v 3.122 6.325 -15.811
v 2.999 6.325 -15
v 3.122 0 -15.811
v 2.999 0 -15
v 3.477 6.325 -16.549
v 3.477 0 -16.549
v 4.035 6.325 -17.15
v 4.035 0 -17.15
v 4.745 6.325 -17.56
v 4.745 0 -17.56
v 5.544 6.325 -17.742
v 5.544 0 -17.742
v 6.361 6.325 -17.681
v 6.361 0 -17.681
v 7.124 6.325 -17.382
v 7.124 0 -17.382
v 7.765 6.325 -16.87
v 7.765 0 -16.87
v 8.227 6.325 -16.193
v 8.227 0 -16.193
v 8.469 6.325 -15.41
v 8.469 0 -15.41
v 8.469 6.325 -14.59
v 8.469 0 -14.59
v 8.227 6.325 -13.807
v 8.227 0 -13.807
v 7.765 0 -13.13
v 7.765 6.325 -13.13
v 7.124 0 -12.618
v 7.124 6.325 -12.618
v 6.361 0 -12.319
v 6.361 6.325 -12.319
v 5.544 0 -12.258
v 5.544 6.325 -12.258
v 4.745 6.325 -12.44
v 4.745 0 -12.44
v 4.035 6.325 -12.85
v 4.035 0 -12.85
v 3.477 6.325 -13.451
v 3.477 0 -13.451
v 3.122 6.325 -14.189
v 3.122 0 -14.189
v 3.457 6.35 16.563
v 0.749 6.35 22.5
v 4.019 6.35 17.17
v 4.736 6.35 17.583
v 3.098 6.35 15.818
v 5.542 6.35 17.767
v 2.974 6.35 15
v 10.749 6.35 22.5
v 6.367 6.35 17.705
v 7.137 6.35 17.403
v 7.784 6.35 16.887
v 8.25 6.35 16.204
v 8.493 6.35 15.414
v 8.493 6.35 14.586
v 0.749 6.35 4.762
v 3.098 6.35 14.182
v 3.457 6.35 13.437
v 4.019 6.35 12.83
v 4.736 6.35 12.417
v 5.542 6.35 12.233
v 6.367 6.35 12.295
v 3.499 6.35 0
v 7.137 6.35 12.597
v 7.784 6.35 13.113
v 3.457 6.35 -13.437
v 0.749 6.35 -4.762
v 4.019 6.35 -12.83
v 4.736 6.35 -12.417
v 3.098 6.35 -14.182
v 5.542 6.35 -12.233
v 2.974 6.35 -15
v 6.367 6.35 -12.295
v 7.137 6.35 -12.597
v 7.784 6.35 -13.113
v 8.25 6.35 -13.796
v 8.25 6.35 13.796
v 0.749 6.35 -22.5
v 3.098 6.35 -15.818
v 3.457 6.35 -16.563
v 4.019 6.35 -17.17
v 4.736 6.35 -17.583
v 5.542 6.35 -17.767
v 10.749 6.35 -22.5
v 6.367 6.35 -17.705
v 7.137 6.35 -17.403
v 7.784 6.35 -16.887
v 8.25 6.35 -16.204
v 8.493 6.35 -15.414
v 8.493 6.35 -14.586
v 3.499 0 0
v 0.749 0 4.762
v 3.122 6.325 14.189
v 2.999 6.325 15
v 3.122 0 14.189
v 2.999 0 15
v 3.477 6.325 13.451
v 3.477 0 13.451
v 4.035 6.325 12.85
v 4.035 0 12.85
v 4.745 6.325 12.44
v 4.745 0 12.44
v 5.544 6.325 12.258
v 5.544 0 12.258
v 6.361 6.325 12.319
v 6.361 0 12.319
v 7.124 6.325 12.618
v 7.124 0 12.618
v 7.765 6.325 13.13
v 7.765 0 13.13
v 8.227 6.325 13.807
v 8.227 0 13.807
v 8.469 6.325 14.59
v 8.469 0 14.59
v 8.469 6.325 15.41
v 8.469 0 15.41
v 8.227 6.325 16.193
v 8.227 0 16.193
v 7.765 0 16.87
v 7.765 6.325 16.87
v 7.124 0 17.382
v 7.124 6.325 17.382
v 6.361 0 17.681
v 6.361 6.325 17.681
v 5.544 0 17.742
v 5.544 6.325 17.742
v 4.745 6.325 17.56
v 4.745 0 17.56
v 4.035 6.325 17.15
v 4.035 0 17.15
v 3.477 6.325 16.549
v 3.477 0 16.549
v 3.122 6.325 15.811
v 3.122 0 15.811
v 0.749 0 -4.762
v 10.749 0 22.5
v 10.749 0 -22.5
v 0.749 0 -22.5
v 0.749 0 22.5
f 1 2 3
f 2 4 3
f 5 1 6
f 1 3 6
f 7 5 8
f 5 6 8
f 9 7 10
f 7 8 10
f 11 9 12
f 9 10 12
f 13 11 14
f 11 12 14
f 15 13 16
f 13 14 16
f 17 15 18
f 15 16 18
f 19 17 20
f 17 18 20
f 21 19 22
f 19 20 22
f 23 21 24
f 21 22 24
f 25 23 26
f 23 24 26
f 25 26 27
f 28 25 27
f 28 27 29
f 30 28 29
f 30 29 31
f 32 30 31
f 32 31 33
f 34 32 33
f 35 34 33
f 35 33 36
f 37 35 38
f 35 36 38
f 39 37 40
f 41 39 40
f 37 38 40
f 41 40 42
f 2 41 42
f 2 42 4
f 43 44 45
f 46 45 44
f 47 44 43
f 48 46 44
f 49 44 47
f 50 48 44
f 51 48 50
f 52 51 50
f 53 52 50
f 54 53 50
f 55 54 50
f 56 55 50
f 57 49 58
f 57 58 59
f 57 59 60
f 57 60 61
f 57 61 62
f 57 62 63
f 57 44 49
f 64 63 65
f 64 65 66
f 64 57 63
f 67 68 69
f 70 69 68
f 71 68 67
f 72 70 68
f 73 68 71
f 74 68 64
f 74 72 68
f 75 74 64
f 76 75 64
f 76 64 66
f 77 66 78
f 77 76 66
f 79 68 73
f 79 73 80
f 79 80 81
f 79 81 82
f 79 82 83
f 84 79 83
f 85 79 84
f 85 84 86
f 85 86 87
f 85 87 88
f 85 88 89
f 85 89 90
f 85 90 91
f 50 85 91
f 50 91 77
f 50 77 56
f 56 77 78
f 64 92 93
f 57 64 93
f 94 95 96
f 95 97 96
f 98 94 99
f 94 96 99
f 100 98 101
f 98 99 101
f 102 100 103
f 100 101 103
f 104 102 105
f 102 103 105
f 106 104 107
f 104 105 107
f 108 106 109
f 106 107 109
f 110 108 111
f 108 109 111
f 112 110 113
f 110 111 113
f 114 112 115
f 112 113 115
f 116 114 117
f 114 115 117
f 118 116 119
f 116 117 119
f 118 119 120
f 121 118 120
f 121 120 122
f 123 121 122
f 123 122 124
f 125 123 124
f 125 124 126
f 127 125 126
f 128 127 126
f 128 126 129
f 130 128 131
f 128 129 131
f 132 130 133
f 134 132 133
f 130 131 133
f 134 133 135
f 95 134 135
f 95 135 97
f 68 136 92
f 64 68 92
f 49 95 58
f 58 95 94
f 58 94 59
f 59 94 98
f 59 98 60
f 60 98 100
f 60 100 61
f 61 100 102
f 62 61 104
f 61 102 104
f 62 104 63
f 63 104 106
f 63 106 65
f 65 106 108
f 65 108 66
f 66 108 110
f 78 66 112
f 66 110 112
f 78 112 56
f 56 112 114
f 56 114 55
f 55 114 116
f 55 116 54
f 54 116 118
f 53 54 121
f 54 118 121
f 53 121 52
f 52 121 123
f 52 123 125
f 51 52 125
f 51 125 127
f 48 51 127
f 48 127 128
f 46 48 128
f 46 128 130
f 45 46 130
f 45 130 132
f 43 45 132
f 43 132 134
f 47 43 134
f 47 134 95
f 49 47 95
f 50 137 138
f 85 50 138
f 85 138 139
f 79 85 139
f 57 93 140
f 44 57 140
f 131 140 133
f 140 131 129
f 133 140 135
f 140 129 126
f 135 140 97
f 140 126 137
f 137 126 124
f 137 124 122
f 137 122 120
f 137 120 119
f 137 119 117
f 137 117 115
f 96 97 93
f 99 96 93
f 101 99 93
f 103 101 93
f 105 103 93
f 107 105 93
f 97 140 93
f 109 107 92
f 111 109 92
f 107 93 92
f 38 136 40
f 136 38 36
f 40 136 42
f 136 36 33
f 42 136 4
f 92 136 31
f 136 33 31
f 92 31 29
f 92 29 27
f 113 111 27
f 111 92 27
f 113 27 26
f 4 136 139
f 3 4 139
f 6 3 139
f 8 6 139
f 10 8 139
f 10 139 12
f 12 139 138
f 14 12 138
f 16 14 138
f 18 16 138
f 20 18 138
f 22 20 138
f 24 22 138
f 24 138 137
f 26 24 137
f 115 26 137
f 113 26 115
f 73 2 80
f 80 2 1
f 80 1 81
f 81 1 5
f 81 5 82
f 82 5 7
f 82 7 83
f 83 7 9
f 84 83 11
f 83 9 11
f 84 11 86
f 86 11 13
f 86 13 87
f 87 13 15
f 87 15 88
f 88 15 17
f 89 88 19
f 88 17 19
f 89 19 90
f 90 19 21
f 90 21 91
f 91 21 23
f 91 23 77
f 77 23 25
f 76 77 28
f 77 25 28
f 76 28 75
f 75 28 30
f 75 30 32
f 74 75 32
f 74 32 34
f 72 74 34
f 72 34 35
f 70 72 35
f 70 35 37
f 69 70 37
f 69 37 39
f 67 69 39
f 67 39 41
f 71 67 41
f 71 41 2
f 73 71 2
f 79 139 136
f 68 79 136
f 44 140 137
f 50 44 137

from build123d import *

# Parameters (mm, degrees)
BOSS_EXTRUDE1_DEPTH            = 6.35
M5_CLEARANCE_HOLE2_D           = 5.5
M5_CLEARANCE_HOLE2_DEPTH       = 10.1
M5_CLEARANCE_HOLE2_CSINK_D     = 5.55
M5_CLEARANCE_HOLE2_CSINK_ANGLE = 90
M5_CLEARANCE_HOLE2_TIP         = 1.652366702


with BuildPart() as part:
    # Sketch1 → Boss-Extrude1 (new body)
    with BuildSketch(Plane(origin=(0, 0, 0), x_dir=(1, 0, 0), z_dir=(0, 1, 0))):
        Polygon((10.749371316, 22.5), (0.749371316, 22.5), (0.749371316, 4.762050808), (3.498742631, 0), (0.749371316, -4.762050808), (0.749371316, -22.5), (10.749371316, -22.5), align=None)
    extrude(amount=BOSS_EXTRUDE1_DEPTH)

    # M5 Clearance Hole2
    with Locations(Plane(origin=(0, 6.35, 0), x_dir=(1, 0, 0), z_dir=(0, 1, 0))):
        with Locations((5.749371316, 15), (5.749371316, -15)):
            CounterSinkHole(M5_CLEARANCE_HOLE2_D / 2, M5_CLEARANCE_HOLE2_CSINK_D / 2, depth=M5_CLEARANCE_HOLE2_DEPTH, counter_sink_angle=M5_CLEARANCE_HOLE2_CSINK_ANGLE)
            with Locations((0, 0, -(M5_CLEARANCE_HOLE2_DEPTH + M5_CLEARANCE_HOLE2_TIP / 2))):  # 118° drill point
                Cone(0, M5_CLEARANCE_HOLE2_D / 2, M5_CLEARANCE_HOLE2_TIP, mode=Mode.SUBTRACT)


solid = part.part
